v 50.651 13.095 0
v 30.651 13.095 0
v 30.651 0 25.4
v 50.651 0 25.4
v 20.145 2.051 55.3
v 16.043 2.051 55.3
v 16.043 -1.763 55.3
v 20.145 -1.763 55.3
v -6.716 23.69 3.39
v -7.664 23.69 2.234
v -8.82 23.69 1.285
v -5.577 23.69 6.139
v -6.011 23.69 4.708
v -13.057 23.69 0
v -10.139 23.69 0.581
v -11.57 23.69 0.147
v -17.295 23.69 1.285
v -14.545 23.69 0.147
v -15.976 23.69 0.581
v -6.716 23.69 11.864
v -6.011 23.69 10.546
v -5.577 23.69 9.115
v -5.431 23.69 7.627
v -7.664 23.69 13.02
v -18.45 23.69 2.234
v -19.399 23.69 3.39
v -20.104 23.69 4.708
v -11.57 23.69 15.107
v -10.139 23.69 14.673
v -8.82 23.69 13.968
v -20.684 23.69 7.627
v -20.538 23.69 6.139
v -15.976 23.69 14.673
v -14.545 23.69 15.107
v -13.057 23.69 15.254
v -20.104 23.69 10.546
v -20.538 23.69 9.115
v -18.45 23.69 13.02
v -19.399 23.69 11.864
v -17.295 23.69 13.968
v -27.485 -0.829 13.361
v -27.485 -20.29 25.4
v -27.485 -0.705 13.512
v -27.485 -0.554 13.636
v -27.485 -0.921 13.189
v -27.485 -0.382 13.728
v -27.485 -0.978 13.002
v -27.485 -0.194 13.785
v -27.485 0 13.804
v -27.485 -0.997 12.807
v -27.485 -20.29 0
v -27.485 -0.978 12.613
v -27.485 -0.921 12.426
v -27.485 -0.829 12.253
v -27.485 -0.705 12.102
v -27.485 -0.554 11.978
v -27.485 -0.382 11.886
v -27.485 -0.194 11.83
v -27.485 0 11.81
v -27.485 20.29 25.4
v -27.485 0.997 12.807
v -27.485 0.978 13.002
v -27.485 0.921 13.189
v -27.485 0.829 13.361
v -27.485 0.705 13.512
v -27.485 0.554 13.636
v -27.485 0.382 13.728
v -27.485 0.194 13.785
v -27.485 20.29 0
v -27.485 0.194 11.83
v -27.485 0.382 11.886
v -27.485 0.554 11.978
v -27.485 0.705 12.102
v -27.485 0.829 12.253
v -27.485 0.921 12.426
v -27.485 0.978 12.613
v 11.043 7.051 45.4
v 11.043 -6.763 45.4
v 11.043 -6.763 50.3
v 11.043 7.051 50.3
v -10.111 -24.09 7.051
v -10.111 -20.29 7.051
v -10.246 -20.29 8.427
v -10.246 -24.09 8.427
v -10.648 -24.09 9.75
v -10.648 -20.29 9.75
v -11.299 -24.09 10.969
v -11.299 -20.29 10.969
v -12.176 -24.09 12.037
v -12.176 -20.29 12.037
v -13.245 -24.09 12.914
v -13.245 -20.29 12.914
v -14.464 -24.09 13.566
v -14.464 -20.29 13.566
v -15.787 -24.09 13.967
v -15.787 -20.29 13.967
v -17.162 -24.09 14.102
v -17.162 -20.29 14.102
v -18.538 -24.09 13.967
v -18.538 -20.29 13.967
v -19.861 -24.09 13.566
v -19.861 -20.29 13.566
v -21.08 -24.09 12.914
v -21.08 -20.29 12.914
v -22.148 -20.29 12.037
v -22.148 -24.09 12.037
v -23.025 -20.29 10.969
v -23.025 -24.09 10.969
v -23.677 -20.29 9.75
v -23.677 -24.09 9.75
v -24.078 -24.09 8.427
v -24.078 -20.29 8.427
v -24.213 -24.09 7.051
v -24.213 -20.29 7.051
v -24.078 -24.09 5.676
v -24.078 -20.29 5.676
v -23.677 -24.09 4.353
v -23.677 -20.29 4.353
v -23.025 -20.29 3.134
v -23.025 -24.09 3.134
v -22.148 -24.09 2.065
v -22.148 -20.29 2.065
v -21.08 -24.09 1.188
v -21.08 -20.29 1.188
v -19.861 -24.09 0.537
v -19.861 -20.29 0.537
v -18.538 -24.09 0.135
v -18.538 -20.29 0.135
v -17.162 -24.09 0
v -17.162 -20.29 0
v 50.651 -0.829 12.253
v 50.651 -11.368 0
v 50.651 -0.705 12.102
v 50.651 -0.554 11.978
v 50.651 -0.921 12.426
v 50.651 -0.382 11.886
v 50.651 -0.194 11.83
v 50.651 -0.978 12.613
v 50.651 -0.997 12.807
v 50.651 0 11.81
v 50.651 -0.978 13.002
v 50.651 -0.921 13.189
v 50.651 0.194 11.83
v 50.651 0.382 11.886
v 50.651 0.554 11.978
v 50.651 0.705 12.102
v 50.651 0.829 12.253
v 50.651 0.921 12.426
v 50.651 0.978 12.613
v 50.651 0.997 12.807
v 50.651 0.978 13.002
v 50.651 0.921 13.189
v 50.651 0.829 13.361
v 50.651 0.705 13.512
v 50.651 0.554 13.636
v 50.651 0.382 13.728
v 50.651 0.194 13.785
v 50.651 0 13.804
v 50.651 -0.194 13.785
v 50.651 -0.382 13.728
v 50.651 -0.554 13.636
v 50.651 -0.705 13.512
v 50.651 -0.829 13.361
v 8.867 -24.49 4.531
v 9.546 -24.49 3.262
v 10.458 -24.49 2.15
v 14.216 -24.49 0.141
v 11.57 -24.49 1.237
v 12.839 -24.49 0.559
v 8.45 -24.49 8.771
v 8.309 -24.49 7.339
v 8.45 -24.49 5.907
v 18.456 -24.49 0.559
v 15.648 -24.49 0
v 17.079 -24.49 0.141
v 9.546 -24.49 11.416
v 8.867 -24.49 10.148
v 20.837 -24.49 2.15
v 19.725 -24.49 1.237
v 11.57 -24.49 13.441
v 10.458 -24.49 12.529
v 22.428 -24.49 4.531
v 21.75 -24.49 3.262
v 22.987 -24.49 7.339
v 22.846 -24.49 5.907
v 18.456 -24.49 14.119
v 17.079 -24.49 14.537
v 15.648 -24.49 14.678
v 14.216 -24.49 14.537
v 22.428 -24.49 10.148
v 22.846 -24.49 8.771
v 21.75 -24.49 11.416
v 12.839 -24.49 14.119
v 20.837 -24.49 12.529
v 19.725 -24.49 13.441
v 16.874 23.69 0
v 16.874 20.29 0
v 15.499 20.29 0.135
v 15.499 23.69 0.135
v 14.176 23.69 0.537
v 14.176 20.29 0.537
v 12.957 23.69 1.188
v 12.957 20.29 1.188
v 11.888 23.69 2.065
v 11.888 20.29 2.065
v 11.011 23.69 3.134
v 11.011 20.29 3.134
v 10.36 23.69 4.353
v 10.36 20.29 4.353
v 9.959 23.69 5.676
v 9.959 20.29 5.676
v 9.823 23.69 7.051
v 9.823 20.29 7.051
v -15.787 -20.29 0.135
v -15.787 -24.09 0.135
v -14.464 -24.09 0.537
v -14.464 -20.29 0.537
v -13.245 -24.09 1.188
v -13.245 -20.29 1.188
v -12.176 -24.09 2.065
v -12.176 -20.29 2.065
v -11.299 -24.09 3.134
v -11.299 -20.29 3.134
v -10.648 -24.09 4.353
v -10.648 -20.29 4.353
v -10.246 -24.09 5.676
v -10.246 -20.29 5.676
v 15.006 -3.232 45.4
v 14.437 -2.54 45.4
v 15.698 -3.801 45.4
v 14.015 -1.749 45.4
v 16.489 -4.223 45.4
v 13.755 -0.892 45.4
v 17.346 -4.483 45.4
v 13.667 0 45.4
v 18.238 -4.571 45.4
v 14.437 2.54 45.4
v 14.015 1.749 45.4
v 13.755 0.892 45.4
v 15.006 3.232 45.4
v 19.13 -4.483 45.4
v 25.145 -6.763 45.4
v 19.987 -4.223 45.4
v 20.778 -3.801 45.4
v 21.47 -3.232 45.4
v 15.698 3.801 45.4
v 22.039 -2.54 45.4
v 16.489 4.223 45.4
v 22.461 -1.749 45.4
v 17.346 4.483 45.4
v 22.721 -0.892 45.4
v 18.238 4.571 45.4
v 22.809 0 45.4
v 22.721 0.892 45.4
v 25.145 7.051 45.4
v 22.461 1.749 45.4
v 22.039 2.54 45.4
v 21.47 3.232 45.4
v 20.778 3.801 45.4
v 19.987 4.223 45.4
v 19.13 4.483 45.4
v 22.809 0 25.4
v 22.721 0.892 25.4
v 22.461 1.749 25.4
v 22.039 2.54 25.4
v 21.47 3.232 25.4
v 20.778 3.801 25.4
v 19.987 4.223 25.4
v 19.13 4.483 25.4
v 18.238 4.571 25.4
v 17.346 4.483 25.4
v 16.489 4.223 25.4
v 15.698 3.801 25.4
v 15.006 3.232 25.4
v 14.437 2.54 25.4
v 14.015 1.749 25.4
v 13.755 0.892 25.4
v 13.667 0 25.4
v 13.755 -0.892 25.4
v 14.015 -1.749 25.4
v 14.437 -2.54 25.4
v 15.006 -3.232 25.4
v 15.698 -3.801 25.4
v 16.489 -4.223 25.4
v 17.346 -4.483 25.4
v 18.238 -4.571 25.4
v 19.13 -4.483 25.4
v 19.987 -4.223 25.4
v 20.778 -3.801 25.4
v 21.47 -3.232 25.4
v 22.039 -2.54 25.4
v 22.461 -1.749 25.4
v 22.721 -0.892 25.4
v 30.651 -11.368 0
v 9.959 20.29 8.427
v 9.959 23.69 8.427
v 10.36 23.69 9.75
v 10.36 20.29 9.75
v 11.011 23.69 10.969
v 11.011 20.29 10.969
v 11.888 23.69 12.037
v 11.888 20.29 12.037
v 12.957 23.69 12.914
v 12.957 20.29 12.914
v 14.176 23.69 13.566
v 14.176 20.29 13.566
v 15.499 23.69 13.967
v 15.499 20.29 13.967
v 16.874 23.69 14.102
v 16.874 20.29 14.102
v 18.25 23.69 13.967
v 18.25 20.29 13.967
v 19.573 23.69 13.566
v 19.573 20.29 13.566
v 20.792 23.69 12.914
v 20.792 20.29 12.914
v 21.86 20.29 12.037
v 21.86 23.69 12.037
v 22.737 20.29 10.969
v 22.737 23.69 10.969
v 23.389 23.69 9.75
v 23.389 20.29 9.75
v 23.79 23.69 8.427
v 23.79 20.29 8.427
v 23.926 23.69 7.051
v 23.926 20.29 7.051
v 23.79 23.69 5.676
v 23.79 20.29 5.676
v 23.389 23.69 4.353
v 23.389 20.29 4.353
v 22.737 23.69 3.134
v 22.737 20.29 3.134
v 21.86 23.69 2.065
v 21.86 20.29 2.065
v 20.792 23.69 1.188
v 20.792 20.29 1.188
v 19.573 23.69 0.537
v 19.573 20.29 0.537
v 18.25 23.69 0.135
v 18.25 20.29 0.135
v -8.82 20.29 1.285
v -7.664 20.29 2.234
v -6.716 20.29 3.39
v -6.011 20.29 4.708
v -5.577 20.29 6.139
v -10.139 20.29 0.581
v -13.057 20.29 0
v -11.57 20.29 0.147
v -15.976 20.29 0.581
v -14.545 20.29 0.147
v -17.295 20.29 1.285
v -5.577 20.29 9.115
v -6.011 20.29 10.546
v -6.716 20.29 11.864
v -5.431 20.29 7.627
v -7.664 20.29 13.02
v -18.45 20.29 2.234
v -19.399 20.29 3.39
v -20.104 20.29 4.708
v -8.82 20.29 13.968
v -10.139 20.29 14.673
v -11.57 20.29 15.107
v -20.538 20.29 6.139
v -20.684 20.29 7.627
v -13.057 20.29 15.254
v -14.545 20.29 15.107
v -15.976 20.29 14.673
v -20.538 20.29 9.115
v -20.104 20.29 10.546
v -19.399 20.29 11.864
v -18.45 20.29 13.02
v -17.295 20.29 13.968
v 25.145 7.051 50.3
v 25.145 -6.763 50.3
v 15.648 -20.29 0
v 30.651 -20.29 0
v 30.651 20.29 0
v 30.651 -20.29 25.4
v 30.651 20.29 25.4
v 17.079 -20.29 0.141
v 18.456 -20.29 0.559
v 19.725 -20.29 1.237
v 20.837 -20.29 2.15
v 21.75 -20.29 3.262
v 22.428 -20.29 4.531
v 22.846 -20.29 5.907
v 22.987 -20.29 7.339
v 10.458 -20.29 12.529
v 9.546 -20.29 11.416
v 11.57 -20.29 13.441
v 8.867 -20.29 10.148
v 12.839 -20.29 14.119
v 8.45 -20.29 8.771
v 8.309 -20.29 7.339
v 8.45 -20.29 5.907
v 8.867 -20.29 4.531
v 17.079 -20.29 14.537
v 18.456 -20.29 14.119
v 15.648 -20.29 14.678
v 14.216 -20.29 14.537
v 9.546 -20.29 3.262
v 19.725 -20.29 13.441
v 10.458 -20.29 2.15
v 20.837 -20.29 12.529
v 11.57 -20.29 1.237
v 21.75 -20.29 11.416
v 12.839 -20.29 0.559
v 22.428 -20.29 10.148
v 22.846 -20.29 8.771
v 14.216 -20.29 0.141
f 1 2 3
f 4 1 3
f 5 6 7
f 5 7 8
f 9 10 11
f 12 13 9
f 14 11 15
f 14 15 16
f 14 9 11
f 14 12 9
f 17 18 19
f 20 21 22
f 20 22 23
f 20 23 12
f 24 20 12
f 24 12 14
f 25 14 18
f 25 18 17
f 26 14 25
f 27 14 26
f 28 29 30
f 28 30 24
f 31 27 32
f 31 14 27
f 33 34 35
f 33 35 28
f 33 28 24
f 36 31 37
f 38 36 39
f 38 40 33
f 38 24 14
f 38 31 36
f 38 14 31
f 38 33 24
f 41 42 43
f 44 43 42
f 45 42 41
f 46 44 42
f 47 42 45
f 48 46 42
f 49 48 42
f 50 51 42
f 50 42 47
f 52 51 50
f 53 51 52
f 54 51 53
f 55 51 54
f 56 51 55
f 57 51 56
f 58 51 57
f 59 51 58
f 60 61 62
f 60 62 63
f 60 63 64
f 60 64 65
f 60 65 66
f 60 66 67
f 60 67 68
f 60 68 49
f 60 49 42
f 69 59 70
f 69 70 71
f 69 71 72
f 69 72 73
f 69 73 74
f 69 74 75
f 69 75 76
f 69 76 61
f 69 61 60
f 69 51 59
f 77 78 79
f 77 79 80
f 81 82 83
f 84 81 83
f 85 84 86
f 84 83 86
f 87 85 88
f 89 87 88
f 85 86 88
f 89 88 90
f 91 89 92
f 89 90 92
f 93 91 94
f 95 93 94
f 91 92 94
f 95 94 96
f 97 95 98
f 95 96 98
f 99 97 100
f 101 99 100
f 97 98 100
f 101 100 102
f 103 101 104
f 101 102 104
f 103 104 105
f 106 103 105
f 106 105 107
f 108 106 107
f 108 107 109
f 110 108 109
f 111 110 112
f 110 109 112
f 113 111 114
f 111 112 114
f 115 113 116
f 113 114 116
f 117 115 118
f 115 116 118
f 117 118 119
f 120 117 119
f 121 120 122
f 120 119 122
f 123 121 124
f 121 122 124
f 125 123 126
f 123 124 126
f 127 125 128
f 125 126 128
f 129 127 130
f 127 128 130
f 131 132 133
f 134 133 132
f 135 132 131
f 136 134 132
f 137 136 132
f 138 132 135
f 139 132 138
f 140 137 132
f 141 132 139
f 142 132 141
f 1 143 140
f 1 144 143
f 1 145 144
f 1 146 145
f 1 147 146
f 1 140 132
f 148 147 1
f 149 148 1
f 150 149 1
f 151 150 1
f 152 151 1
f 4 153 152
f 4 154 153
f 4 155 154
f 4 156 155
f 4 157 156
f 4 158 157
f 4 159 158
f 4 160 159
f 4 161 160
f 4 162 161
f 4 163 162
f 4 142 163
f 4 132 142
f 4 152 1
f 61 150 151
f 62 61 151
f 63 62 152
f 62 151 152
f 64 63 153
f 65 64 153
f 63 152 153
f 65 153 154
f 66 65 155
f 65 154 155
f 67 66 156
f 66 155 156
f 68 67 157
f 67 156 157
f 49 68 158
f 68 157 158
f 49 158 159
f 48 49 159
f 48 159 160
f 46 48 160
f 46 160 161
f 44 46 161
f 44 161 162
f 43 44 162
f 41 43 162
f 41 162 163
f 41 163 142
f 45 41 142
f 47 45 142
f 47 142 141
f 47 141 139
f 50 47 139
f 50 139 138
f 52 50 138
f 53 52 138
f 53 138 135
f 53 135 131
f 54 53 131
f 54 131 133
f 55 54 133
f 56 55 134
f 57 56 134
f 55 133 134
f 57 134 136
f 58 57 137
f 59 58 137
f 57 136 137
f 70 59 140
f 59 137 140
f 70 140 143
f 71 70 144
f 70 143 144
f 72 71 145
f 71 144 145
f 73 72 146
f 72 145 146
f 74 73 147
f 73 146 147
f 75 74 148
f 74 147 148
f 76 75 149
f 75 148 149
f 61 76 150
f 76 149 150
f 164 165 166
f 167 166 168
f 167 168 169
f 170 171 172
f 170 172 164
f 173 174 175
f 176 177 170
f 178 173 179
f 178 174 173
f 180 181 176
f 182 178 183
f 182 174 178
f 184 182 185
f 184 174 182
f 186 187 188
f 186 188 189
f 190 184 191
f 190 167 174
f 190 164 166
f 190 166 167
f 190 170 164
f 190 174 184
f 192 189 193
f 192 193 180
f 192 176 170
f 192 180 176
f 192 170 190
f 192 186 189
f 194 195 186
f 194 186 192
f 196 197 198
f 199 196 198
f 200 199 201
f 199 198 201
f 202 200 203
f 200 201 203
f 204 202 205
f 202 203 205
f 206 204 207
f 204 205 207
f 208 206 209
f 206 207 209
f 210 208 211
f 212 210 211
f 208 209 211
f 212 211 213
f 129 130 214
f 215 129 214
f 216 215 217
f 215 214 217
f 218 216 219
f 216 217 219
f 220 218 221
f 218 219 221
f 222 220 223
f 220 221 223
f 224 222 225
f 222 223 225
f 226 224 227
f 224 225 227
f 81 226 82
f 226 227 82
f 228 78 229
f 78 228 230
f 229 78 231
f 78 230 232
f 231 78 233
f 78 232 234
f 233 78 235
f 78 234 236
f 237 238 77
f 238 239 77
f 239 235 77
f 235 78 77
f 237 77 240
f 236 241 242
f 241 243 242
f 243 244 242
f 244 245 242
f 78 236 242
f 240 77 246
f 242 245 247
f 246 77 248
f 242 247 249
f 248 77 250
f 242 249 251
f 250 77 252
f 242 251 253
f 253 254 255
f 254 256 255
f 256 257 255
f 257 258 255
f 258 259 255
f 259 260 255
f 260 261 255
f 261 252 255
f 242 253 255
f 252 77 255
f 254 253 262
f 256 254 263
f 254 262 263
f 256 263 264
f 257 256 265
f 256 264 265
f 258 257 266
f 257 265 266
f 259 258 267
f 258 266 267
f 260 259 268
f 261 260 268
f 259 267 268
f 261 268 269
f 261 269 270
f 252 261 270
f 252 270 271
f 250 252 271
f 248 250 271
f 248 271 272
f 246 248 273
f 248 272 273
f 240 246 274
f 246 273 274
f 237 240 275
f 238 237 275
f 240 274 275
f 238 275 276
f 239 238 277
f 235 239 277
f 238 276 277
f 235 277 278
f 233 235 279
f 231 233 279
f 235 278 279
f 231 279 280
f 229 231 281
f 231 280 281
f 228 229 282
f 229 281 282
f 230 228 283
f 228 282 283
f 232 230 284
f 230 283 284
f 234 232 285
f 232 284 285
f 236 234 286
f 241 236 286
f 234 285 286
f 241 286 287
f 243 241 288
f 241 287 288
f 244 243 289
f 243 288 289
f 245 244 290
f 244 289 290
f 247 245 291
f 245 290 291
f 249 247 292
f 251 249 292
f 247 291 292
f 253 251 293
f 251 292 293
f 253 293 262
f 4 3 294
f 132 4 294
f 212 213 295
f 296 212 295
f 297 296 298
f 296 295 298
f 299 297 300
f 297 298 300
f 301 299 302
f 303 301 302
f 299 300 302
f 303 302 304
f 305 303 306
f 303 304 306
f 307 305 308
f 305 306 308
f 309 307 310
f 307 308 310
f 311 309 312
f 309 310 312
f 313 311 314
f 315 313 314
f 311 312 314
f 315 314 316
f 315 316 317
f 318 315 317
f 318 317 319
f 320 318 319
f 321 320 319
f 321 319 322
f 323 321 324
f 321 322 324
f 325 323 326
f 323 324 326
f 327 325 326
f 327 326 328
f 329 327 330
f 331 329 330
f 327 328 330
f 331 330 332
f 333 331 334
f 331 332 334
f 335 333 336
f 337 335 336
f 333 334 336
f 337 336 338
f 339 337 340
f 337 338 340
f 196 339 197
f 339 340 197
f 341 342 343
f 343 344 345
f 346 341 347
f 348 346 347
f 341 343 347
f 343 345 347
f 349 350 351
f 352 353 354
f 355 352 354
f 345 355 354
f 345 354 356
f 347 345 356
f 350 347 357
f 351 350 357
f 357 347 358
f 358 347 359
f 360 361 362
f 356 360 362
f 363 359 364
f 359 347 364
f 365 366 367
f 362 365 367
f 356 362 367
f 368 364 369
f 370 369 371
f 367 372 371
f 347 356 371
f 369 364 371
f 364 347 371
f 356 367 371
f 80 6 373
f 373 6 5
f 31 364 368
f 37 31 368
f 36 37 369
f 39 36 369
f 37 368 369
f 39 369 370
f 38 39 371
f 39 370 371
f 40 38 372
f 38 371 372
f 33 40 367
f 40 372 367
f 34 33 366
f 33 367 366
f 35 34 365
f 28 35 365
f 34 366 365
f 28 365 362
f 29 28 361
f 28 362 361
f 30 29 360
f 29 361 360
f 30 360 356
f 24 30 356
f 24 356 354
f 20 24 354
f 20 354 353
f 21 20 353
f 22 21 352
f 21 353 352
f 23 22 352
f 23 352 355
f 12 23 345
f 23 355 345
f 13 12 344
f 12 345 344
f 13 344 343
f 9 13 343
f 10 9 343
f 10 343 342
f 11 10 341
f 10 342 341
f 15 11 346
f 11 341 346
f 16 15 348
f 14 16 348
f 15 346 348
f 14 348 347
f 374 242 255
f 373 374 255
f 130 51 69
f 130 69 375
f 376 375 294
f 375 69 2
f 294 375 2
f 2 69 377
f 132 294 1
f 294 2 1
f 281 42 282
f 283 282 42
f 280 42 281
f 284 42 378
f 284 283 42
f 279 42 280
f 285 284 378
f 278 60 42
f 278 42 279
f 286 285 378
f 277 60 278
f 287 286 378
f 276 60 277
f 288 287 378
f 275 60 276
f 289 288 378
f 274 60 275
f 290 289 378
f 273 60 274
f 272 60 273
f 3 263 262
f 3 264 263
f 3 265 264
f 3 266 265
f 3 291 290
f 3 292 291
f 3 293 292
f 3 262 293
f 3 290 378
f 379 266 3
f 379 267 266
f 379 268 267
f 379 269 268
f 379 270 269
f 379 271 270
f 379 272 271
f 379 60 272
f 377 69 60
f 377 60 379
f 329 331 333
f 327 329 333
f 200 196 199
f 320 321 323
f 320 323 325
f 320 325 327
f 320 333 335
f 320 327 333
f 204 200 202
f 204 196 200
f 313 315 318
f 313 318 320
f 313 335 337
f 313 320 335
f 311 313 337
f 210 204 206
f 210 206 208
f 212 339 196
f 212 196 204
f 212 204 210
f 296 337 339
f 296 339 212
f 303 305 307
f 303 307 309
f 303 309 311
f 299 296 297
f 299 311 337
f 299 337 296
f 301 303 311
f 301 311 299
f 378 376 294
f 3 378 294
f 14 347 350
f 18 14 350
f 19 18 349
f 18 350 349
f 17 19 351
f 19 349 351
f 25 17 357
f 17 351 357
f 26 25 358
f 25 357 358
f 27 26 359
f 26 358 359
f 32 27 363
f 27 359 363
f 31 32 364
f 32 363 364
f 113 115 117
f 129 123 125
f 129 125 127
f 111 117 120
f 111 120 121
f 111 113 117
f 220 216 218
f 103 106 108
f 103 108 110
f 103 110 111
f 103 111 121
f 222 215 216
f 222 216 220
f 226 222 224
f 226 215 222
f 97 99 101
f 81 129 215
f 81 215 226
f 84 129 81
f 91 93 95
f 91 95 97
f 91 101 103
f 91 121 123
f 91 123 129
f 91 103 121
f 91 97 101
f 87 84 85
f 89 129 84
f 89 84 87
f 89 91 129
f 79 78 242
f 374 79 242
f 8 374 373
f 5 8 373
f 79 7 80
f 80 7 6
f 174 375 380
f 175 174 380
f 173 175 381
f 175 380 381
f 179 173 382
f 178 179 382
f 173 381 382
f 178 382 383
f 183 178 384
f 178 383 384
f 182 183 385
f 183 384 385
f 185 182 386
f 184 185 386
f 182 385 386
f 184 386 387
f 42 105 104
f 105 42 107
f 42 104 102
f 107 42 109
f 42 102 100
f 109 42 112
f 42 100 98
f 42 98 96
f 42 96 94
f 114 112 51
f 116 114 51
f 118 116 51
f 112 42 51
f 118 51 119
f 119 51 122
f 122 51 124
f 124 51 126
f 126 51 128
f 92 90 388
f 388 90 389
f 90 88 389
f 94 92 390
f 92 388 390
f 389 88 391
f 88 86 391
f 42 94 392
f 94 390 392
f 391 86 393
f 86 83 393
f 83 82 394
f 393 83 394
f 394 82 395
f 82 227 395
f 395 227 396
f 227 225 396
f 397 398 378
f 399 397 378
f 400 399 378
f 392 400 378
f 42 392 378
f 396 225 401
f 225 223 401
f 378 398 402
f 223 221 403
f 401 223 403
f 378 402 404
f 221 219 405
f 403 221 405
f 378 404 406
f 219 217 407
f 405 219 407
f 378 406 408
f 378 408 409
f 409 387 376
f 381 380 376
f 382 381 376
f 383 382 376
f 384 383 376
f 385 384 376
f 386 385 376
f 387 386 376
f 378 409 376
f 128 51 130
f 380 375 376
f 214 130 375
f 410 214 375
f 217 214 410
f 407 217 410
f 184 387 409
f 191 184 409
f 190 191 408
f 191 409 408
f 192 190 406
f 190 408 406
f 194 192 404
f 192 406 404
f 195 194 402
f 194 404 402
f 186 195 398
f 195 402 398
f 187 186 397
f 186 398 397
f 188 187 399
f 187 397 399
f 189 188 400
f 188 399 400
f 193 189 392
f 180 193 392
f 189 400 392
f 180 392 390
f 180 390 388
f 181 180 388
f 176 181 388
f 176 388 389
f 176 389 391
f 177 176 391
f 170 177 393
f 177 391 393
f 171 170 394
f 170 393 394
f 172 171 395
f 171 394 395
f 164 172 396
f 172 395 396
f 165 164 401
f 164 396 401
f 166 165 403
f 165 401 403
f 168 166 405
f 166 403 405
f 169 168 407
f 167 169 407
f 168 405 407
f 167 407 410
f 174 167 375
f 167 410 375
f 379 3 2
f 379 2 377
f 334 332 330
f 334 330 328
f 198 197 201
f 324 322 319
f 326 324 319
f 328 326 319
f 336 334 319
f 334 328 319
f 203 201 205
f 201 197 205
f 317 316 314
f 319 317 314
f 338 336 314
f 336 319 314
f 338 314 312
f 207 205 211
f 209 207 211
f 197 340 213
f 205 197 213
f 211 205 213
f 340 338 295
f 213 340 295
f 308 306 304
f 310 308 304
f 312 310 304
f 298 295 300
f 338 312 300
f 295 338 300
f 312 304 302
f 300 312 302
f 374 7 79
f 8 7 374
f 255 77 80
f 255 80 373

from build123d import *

# Parameters (mm, degrees)
F0_W      = 58.1367611885
F0_H      = 40.580611676
F1_DEPTH  = 25.4
F3_DEPTH  = 20
F4_R      = 4.5710395081
F5_DEPTH  = 20
F6_W      = 14.1024822369
F6_H      = 13.814676553
F7_DEPTH  = 9.9
F8_SIZE   = 5
F10_DEPTH = 3.8
F12_DEPTH = 4.2
F14_DEPTH = 3.4
F16_DEPTH = 3.4
F18_D     = 1.9939


with BuildPart() as f1:
    # F0 (on Top) → F1 (new body)
    with BuildSketch(Plane.XY):
        with Locations((1.5829298645, 0)):
            Rectangle(F0_W, F0_H)
    extrude(amount=F1_DEPTH)

    # F2 (on face) → F3 (join)
    with BuildSketch(Plane.YZ.offset(30.6513104588)):
        Polygon((13.0951609462, 0), (0, 25.4), (-11.3683268428, 0), align=None)
    extrude(amount=F3_DEPTH)

    # F4 (on face) → F5 (join)
    with BuildSketch(Plane.XY.offset(25.4)):
        with Locations((18.2379763573, 0)):
            Circle(F4_R)
    extrude(amount=F5_DEPTH)

    # F6 (on face) → F7 (join)
    with BuildSketch(Plane.XY.offset(45.4)):
        with Locations((18.0940716527, 0.143902842)):
            Rectangle(F6_W, F6_H)
    extrude(amount=F7_DEPTH)

    # F8
    f8_edges = [f1.edges().sort_by_distance(p)[0] for p in [
        (18.094072, 7.051241, 55.3),
        (11.042831, 0.143903, 55.3),
        (18.094072, -6.763435, 55.3),
        (25.145313, 0.143903, 55.3),
    ]]
    chamfer(f8_edges, length=F8_SIZE)

    # F9 (on face) → F10 (join)
    with BuildSketch(Plane.XZ.offset(20.290305838)):
        with BuildLine():
            ThreePointArc((-17.1621330082, 0), (-12.1761525976, 2.0652607078), (-10.1108918898, 7.0512411185))
            ThreePointArc((-10.1108918898, 7.0512411185), (-22.1481134189, 12.0372215291), (-17.1621330082, 0))
        make_face()
    extrude(amount=F10_DEPTH)

    # F11 (on face) → F12 (join)
    with BuildSketch(Plane.XZ.offset(20.290305838)):
        with BuildLine():
            ThreePointArc((15.647722408, 0), (20.8372121695, 2.1495570409), (22.9867692105, 7.3390468024))
            ThreePointArc((22.9867692105, 7.3390468024), (10.4582326468, 12.5285365638), (15.647722408, 0))
        make_face()
    extrude(amount=F12_DEPTH)

    # F18 (through all)
    with Locations(Plane(origin=(-27.4854507297, 0, 0), x_dir=(0, -1, 0), z_dir=(-1, 0, 0))):
        with Locations((0, 12.8073561937)):
            Hole(F18_D / 2)


with BuildPart() as f14:
    # F13 (on face) → F14 (new body)
    with BuildSketch(Plane(origin=(0, 20.290305838, 0), x_dir=(-1, 0, 0), z_dir=(0, 1, 0))):
        with BuildLine():
            ThreePointArc((-16.8743282557, 0), (-11.888347845, 2.0652607078), (-9.8230871372, 7.0512411185))
            ThreePointArc((-9.8230871372, 7.0512411185), (-21.8603086663, 12.0372215291), (-16.8743282557, 0))
        make_face()
    extrude(amount=F14_DEPTH)


with BuildPart() as f16:
    # F15 (on face) → F16 (new body)
    with BuildSketch(Plane(origin=(0, 20.290305838, 0), x_dir=(-1, 0, 0), z_dir=(0, 1, 0))):
        with BuildLine():
            ThreePointArc((13.0574721843, 0), (18.4504712965, 2.2338533741), (20.6843246706, 7.6268524863))
            ThreePointArc((20.6843246706, 7.6268524863), (7.6644730721, 13.0198515984), (13.0574721843, 0))
        make_face()
    extrude(amount=F16_DEPTH)


solid = Compound([f1.part, f14.part, f16.part])
